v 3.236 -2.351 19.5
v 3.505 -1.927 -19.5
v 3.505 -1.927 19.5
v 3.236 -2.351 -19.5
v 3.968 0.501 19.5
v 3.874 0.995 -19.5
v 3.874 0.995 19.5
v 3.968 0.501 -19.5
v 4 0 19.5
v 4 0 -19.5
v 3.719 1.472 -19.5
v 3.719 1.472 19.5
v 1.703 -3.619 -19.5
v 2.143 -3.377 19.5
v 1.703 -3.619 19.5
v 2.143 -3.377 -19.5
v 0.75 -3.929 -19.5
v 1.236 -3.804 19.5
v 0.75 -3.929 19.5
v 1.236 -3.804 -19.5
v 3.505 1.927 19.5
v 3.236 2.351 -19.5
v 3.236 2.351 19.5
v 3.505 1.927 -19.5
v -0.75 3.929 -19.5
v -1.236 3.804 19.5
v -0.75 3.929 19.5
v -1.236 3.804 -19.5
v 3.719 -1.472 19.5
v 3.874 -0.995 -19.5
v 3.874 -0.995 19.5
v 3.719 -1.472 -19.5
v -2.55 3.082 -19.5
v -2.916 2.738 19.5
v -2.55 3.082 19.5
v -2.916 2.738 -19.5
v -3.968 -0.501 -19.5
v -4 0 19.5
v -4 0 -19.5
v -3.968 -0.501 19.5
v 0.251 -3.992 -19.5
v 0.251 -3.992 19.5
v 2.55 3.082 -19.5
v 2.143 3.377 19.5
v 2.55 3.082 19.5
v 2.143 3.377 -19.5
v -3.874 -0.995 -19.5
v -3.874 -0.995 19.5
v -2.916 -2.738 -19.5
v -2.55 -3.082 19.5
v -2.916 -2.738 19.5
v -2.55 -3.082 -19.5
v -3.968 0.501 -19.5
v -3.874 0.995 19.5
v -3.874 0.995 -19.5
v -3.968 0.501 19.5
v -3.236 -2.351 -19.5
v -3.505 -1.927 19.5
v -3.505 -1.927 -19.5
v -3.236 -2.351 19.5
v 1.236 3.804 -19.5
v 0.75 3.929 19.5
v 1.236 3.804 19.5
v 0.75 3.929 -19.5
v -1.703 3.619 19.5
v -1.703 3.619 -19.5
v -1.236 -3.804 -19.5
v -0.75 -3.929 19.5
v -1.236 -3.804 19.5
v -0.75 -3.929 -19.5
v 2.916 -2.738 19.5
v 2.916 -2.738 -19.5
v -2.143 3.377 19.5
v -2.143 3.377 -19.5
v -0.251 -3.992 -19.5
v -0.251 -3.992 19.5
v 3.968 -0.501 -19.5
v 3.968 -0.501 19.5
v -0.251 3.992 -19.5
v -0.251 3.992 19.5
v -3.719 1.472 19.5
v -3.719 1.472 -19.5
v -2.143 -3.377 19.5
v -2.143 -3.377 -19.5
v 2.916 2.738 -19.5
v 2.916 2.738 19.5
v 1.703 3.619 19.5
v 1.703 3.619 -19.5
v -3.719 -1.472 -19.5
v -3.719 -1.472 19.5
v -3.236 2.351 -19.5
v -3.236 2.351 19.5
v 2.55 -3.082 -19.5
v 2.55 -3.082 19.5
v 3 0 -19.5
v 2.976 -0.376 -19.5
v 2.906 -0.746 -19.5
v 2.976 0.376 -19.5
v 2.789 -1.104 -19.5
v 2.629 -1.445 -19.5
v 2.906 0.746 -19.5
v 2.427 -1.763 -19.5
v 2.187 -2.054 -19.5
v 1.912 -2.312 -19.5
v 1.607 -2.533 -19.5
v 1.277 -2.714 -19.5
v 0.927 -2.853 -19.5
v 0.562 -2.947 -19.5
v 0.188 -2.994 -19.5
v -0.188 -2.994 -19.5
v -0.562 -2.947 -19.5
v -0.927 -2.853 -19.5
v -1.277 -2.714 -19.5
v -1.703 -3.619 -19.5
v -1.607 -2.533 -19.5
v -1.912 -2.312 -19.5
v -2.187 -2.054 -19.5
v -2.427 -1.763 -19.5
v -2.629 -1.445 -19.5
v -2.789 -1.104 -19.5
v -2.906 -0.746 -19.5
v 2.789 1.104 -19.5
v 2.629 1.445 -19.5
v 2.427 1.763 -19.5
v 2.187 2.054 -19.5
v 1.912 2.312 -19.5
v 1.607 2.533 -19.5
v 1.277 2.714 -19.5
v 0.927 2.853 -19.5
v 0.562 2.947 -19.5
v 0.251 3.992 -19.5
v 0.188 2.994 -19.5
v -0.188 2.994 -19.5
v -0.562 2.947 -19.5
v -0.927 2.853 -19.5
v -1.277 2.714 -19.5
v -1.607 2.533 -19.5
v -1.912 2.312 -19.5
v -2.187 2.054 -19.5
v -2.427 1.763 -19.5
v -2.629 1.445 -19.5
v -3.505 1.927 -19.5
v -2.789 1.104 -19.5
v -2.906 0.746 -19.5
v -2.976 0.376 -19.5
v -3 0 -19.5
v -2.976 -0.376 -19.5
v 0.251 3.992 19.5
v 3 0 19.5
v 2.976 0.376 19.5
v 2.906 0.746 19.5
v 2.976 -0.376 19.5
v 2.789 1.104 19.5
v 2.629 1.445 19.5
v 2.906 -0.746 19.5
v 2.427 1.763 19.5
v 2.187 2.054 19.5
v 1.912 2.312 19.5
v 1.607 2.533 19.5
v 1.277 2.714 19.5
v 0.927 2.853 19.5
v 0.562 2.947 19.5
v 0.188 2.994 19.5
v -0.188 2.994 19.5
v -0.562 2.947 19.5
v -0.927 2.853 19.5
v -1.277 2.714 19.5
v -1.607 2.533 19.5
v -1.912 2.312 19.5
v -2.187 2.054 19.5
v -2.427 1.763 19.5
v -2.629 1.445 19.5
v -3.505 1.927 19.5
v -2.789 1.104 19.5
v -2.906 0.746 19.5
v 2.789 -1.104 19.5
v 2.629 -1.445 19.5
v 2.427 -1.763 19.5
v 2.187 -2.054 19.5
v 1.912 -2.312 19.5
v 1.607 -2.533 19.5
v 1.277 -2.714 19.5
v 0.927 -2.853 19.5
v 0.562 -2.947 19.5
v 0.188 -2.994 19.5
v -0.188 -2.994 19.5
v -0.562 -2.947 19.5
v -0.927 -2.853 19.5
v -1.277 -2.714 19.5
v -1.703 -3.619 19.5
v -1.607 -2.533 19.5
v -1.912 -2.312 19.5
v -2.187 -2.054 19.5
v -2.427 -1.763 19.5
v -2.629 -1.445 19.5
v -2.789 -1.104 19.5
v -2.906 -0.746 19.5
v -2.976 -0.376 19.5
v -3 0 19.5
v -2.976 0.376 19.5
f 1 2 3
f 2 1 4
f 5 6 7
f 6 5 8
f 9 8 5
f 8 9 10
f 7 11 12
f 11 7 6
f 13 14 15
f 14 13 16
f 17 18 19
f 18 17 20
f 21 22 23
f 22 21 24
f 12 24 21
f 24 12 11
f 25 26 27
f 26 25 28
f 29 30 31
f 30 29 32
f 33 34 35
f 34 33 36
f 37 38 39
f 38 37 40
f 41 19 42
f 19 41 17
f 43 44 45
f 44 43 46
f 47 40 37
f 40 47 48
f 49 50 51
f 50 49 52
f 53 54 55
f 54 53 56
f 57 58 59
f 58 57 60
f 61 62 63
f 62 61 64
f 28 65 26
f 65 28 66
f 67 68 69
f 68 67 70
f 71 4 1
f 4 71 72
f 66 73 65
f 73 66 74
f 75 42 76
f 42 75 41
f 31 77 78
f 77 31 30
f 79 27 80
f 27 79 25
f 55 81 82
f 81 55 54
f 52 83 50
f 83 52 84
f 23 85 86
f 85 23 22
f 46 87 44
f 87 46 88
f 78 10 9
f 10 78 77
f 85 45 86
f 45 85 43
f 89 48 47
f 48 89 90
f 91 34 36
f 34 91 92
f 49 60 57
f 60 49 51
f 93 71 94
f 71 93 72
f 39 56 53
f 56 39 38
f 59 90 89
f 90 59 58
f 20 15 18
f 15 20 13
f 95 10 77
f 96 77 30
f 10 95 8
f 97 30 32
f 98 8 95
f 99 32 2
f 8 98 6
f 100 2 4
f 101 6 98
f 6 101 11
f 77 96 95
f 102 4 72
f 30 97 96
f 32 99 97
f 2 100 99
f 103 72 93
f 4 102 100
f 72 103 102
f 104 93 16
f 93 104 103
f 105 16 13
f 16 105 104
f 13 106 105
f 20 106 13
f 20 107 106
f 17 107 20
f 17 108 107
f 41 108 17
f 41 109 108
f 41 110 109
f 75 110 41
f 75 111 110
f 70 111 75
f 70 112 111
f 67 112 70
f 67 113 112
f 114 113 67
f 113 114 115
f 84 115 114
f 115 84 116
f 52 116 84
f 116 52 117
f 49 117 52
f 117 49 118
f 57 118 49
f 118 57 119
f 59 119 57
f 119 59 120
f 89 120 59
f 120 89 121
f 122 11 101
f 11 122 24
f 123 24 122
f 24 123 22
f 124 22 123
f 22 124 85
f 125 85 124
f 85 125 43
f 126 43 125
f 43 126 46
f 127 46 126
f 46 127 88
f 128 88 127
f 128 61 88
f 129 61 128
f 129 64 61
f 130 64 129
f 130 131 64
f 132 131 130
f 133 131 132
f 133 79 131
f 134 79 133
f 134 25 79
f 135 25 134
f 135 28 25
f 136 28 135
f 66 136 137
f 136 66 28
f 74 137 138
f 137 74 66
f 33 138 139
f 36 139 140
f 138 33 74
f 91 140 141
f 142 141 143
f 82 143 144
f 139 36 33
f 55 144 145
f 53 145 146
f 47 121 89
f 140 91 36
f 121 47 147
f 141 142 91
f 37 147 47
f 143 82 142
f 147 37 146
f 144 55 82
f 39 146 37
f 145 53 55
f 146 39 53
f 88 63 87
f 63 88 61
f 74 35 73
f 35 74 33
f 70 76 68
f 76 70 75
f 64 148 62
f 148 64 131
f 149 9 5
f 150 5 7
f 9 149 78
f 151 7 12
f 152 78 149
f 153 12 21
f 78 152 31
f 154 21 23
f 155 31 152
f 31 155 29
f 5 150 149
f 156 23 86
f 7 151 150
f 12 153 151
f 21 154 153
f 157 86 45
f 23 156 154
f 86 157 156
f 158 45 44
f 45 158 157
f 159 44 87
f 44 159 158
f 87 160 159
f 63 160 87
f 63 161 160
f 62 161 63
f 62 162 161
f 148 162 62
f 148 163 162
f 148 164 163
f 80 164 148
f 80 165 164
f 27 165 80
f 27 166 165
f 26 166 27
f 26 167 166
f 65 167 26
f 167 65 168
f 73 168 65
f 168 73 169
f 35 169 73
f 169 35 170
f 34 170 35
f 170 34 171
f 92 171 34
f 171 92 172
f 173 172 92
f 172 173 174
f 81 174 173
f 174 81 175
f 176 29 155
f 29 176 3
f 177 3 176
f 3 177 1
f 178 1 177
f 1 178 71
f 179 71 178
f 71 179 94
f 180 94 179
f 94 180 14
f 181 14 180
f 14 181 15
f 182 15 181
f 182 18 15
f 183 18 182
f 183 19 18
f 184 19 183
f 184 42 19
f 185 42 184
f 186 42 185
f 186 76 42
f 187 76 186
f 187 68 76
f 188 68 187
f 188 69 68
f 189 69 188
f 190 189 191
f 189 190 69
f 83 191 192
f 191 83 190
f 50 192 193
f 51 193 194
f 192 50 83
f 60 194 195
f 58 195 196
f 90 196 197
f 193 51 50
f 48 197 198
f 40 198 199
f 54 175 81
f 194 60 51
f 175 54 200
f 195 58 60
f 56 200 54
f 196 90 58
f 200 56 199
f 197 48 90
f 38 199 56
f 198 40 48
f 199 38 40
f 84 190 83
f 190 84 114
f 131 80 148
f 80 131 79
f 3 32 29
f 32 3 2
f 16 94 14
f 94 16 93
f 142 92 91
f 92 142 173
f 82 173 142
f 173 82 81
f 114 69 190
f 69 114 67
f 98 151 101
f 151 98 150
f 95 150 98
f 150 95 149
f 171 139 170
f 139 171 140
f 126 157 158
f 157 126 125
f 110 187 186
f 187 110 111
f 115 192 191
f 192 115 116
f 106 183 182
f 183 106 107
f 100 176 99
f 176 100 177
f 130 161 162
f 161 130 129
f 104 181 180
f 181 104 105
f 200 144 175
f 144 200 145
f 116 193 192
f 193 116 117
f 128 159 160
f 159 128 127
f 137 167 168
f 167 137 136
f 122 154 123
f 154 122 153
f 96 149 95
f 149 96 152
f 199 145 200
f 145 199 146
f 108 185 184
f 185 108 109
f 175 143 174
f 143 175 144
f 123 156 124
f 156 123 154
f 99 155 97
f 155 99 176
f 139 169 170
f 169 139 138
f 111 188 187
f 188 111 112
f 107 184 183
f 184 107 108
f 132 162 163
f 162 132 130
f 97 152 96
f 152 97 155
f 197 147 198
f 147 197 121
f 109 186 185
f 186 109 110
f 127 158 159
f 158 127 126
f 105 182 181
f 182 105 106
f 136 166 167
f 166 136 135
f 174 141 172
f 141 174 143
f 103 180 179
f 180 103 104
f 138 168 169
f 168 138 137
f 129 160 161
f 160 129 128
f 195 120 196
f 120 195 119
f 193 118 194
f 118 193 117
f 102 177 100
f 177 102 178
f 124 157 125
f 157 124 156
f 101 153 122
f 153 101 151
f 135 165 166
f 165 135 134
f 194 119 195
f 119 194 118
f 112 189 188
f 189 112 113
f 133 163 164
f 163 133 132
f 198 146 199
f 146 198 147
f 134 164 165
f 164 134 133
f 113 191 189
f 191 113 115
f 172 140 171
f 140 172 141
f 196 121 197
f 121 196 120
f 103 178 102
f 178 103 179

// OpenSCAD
$fn = 50;


difference() {
	union() {
		translate(v = [0, 0, -19.5000000000]) {
			cylinder(h = 39, r = 4.0000000000);
		}
	}
	union() {
		translate(v = [0, 0, -100.0000000000]) {
			cylinder(h = 200, r = 3.0000000000);
		}
	}
}
